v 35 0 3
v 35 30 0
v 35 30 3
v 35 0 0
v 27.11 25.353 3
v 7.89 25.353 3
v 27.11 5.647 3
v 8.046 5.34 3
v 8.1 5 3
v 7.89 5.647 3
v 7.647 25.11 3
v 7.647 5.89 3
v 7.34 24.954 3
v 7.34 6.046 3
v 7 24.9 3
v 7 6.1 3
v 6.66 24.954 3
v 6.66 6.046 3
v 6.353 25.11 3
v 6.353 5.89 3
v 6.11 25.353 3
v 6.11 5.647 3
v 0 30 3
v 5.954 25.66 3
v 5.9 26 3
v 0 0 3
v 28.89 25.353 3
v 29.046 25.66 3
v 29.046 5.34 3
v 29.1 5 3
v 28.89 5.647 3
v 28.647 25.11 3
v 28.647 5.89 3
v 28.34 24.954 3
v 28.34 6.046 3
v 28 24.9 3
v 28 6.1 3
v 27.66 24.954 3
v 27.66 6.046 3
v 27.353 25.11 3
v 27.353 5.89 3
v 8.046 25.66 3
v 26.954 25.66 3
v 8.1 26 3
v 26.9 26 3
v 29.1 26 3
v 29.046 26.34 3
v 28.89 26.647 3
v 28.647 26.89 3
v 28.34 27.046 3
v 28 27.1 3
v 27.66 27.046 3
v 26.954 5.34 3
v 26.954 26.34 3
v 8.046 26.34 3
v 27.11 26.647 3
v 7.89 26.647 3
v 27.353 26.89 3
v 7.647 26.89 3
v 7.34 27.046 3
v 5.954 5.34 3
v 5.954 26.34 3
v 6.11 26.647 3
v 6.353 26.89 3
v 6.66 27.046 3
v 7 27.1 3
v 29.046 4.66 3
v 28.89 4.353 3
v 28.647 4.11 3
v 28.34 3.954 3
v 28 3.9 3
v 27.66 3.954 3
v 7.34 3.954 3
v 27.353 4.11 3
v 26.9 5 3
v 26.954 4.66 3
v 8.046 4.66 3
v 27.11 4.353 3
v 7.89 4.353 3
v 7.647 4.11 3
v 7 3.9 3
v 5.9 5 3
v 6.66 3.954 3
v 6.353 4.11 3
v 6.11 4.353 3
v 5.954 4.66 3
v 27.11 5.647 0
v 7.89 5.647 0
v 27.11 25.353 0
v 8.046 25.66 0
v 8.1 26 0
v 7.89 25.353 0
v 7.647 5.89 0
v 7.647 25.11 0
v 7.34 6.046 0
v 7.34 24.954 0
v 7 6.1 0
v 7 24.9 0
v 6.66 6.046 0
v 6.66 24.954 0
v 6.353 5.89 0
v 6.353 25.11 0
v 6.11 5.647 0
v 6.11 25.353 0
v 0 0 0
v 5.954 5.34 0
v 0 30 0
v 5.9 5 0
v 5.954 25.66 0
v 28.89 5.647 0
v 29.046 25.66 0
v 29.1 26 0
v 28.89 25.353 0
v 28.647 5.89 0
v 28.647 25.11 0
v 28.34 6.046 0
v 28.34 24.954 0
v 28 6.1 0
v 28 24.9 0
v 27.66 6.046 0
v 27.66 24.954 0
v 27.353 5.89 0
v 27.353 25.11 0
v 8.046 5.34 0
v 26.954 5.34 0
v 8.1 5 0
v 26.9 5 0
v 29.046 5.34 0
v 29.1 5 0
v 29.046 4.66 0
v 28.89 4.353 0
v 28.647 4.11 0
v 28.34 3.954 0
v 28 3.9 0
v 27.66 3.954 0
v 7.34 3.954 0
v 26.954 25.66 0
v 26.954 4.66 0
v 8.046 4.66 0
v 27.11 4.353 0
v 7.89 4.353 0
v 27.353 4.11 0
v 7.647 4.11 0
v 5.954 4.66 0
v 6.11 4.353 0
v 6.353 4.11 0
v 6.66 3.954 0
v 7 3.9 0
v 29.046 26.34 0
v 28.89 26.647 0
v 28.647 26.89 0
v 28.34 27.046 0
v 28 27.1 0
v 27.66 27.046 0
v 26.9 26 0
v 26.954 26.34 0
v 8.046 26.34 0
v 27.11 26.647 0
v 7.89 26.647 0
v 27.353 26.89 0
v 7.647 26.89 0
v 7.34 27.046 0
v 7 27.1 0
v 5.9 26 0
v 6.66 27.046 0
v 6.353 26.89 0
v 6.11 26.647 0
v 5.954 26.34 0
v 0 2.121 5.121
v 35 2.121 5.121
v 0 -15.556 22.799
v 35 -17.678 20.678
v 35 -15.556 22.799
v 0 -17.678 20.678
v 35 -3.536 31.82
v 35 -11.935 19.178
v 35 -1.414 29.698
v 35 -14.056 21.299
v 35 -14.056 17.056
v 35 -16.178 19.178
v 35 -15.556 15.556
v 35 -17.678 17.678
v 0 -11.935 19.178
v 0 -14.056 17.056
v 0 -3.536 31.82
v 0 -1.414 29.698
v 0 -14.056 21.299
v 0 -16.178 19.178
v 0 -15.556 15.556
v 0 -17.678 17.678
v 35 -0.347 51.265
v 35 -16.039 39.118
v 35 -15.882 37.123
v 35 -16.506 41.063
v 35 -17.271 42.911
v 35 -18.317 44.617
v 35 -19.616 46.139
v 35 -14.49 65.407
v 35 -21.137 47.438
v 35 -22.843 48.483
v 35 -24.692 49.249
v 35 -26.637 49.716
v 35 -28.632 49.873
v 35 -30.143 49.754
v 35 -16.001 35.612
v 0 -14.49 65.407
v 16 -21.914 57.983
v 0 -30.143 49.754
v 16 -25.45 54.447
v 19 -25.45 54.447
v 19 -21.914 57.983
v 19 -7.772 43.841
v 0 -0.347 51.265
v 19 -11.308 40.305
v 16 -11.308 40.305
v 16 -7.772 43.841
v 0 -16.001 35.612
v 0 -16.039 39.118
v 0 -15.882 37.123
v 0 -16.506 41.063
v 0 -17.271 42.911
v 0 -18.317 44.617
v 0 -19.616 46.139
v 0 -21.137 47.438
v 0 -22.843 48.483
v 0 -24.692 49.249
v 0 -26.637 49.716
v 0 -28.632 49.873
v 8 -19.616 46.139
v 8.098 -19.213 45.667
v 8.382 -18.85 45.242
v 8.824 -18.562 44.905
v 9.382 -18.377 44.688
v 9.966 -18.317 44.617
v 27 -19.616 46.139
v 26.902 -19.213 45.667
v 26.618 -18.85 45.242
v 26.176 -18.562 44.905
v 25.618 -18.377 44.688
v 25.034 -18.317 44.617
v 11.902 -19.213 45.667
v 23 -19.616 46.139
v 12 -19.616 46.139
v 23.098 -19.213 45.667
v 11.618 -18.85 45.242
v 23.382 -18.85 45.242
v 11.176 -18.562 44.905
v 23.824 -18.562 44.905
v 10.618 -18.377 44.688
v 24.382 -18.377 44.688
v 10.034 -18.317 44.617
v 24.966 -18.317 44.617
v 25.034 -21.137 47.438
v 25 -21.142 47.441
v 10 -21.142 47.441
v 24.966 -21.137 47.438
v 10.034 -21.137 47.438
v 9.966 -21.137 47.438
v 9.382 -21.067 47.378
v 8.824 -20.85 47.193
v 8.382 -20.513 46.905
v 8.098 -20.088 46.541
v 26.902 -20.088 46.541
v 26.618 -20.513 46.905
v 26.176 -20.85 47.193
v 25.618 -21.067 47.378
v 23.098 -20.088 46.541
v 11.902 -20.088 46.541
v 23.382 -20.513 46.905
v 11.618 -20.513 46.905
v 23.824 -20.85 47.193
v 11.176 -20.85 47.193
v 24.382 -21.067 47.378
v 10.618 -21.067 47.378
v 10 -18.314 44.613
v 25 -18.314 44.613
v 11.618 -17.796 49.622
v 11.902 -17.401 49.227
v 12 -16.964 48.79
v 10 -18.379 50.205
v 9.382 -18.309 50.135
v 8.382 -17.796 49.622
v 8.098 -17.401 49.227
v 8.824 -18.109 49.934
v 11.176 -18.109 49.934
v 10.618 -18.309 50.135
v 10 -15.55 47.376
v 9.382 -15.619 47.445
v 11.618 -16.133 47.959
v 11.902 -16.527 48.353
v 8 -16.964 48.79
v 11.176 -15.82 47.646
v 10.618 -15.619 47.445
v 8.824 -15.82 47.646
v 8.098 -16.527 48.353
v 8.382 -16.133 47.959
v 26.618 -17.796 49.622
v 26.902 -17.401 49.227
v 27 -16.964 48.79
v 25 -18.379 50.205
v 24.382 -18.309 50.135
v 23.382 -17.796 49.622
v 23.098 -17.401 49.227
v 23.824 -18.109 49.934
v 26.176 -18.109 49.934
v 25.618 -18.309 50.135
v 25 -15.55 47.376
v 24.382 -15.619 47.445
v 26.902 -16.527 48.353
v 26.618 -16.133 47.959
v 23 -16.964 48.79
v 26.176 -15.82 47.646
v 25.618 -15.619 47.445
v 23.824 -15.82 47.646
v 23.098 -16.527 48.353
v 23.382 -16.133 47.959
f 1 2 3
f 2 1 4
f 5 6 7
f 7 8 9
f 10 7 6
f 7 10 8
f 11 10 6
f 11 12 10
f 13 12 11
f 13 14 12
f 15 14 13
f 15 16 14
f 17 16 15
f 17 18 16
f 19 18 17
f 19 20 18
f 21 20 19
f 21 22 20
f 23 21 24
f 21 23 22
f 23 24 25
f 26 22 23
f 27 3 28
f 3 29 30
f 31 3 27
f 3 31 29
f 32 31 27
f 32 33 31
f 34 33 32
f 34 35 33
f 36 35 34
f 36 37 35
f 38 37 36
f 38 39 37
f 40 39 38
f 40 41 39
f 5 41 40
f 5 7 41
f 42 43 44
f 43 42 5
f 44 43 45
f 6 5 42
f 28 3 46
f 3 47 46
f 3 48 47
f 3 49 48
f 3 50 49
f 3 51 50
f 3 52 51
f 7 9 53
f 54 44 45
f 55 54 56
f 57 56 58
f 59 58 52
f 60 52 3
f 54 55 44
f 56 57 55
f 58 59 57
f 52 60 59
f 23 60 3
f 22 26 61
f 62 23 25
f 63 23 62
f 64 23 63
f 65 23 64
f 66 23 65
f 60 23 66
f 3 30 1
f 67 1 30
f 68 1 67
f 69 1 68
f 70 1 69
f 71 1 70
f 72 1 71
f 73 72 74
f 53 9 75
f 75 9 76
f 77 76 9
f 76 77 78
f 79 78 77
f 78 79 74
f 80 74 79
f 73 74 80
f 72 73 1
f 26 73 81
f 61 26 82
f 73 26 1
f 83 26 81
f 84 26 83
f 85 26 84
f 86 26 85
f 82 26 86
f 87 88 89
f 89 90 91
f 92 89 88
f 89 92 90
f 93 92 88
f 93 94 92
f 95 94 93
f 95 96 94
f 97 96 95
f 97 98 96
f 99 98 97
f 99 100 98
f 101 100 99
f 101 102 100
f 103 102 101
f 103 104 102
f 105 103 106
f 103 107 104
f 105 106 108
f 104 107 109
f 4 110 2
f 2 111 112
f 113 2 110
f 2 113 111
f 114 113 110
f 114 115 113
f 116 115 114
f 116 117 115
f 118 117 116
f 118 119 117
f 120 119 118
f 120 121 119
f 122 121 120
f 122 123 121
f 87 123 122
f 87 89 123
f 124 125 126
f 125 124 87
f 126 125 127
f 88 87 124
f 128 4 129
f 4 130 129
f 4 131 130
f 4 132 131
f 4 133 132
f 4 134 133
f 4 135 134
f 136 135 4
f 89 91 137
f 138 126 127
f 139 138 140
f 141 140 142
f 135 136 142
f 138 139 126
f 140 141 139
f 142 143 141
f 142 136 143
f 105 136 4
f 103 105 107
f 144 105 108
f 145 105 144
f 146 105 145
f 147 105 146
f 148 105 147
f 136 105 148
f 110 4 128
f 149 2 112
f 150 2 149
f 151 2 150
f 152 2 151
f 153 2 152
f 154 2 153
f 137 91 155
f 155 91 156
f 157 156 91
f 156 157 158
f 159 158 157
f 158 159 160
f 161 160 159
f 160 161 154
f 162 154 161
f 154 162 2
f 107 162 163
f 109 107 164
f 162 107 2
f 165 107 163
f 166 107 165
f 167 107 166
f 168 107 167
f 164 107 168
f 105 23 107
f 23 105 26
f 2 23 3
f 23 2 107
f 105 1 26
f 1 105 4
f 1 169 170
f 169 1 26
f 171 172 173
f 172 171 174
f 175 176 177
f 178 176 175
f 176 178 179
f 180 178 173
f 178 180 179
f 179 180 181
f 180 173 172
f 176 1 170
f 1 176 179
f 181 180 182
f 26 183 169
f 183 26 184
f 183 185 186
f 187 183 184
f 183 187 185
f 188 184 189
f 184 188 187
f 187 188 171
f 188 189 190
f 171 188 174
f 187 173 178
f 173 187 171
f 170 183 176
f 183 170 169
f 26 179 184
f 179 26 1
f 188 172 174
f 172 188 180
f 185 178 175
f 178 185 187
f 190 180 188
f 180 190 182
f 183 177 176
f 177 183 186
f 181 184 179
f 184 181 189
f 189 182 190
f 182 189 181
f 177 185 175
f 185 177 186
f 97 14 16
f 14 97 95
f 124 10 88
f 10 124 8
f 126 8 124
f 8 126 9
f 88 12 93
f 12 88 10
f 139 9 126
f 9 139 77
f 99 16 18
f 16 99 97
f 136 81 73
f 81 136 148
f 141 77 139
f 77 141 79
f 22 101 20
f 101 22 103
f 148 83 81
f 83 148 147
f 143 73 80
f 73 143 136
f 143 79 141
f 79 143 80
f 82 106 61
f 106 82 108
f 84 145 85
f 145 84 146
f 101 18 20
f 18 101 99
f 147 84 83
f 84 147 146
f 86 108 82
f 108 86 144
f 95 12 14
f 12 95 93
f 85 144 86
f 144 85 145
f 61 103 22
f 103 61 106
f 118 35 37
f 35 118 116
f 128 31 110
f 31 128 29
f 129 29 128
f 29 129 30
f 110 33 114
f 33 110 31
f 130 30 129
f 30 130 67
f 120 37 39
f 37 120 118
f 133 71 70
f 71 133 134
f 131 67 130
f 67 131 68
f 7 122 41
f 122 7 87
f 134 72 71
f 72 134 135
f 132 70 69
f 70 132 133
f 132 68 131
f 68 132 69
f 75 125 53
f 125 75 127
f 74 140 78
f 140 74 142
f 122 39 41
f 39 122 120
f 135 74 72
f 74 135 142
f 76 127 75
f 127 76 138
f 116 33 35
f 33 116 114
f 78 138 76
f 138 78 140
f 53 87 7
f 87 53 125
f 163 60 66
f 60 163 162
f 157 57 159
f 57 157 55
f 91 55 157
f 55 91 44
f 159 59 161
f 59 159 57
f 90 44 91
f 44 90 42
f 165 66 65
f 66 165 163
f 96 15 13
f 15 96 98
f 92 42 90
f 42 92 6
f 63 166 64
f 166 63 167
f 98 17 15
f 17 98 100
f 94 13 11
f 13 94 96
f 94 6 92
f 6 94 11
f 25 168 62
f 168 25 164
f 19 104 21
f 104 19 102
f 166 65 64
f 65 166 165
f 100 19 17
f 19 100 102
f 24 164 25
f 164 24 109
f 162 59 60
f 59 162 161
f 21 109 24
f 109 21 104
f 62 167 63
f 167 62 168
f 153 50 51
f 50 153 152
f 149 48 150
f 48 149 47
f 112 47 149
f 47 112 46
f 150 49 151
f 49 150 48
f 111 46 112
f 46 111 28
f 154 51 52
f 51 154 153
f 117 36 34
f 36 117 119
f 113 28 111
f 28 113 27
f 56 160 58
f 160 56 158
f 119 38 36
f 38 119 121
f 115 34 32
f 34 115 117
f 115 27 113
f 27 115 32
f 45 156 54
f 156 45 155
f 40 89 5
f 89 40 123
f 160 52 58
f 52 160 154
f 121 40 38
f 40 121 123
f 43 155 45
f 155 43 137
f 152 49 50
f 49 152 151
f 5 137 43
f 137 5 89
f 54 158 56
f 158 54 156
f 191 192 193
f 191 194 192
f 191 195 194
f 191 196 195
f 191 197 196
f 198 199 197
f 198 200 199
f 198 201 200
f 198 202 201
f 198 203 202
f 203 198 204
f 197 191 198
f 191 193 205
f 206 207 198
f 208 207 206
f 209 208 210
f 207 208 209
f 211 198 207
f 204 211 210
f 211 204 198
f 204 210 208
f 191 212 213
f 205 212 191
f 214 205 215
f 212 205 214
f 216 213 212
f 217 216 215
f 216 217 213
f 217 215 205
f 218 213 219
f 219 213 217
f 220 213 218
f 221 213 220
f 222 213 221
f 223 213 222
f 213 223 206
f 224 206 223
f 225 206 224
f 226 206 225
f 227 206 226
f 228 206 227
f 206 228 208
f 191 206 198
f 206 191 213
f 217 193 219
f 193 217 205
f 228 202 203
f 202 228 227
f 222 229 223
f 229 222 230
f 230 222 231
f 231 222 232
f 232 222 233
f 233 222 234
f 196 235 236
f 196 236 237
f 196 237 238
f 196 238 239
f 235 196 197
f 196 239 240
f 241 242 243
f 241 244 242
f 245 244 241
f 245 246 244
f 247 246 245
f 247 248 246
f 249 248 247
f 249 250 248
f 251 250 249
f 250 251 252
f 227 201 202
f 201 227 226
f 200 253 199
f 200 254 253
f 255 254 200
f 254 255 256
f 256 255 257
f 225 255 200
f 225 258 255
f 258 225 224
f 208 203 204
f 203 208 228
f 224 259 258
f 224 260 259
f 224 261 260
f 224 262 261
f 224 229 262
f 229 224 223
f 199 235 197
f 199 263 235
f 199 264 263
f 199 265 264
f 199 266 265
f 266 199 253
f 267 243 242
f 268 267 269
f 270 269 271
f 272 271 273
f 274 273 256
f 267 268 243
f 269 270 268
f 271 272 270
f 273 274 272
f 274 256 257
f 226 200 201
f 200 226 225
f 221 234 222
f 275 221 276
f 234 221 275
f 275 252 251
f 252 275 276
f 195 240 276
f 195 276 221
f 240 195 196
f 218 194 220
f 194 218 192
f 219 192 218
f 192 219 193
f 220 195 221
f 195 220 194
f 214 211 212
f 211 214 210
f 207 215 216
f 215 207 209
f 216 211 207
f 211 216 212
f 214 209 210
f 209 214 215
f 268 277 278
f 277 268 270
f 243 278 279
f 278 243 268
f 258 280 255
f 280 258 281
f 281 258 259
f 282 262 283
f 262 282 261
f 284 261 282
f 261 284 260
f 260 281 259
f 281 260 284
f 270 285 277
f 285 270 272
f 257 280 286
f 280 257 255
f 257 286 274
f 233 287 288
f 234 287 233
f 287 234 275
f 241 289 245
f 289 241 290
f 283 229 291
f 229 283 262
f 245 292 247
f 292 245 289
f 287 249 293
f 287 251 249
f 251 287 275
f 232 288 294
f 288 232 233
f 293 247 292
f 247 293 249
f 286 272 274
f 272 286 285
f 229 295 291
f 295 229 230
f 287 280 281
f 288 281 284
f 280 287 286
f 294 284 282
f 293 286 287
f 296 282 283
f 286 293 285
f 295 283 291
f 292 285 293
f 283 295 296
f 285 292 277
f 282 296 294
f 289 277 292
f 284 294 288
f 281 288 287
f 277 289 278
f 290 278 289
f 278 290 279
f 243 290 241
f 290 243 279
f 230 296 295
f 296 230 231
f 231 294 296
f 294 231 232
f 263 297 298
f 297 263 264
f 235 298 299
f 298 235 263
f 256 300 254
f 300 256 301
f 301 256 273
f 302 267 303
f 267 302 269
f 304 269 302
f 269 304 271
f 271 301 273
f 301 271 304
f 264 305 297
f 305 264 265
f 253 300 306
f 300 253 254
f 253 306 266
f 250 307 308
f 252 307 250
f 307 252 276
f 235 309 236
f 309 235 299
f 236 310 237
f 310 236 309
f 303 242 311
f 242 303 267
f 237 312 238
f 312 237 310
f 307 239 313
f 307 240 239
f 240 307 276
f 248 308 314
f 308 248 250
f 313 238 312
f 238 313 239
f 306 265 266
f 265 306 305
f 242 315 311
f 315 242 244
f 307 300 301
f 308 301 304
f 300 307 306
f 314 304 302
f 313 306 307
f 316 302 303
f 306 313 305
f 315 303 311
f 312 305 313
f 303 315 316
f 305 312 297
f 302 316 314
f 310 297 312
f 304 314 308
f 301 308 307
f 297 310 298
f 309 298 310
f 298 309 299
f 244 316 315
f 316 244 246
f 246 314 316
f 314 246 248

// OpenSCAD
// Simple Camera Mount - Minimal Design
// Quick print for testing camera position

camera_angle = 45;  // Adjust angle (30-60 degrees)
tube_diameter = 25; // Robot arm diameter

difference() {
    union() {
        // Camera plate
        cube([35, 30, 3]);
        
        // Angle support
        translate([0, 0, 3])
            rotate([camera_angle, 0, 0])
                cube([35, 3, 25]);
        
        // Back support
        translate([0, 0, 0])
            rotate([camera_angle, 0, 0])
                translate([0, 0, 22])
                    cube([35, 20, 3]);
    }
    
    // Camera holes M2 (21mm spacing)
    translate([7, 5, -1]) cylinder(h=5, d=2.2, $fn=20);
    translate([28, 5, -1]) cylinder(h=5, d=2.2, $fn=20);
    translate([7, 26, -1]) cylinder(h=5, d=2.2, $fn=20);
    translate([28, 26, -1]) cylinder(h=5, d=2.2, $fn=20);
}

// Tube clamp
translate([0, -tube_diameter/2 - 8, 0])
    rotate([camera_angle, 0, 0])
        translate([0, 0, 22])
            difference() {
                translate([0, tube_diameter/2 + 3, 0])
                    cube([35, tube_diameter + 10, 20]);
                
                // Tube hole
                translate([17.5, tube_diameter/2 + 8, 10])
                    rotate([0, 90, 0])
                        cylinder(h=40, d=tube_diameter + 0.5, center=true, $fn=40);
                
                // Clamp gap
                translate([16, tube_diameter + 10, -1])
                    cube([3, 5, 22]);
                
                // Bolt holes
                translate([10, tube_diameter + 12, 10])
                    rotate([90, 0, 0])
                        cylinder(h=10, d=4, $fn=20);
                translate([25, tube_diameter + 12, 10])
                    rotate([90, 0, 0])
                        cylinder(h=10, d=4, $fn=20);
            }
